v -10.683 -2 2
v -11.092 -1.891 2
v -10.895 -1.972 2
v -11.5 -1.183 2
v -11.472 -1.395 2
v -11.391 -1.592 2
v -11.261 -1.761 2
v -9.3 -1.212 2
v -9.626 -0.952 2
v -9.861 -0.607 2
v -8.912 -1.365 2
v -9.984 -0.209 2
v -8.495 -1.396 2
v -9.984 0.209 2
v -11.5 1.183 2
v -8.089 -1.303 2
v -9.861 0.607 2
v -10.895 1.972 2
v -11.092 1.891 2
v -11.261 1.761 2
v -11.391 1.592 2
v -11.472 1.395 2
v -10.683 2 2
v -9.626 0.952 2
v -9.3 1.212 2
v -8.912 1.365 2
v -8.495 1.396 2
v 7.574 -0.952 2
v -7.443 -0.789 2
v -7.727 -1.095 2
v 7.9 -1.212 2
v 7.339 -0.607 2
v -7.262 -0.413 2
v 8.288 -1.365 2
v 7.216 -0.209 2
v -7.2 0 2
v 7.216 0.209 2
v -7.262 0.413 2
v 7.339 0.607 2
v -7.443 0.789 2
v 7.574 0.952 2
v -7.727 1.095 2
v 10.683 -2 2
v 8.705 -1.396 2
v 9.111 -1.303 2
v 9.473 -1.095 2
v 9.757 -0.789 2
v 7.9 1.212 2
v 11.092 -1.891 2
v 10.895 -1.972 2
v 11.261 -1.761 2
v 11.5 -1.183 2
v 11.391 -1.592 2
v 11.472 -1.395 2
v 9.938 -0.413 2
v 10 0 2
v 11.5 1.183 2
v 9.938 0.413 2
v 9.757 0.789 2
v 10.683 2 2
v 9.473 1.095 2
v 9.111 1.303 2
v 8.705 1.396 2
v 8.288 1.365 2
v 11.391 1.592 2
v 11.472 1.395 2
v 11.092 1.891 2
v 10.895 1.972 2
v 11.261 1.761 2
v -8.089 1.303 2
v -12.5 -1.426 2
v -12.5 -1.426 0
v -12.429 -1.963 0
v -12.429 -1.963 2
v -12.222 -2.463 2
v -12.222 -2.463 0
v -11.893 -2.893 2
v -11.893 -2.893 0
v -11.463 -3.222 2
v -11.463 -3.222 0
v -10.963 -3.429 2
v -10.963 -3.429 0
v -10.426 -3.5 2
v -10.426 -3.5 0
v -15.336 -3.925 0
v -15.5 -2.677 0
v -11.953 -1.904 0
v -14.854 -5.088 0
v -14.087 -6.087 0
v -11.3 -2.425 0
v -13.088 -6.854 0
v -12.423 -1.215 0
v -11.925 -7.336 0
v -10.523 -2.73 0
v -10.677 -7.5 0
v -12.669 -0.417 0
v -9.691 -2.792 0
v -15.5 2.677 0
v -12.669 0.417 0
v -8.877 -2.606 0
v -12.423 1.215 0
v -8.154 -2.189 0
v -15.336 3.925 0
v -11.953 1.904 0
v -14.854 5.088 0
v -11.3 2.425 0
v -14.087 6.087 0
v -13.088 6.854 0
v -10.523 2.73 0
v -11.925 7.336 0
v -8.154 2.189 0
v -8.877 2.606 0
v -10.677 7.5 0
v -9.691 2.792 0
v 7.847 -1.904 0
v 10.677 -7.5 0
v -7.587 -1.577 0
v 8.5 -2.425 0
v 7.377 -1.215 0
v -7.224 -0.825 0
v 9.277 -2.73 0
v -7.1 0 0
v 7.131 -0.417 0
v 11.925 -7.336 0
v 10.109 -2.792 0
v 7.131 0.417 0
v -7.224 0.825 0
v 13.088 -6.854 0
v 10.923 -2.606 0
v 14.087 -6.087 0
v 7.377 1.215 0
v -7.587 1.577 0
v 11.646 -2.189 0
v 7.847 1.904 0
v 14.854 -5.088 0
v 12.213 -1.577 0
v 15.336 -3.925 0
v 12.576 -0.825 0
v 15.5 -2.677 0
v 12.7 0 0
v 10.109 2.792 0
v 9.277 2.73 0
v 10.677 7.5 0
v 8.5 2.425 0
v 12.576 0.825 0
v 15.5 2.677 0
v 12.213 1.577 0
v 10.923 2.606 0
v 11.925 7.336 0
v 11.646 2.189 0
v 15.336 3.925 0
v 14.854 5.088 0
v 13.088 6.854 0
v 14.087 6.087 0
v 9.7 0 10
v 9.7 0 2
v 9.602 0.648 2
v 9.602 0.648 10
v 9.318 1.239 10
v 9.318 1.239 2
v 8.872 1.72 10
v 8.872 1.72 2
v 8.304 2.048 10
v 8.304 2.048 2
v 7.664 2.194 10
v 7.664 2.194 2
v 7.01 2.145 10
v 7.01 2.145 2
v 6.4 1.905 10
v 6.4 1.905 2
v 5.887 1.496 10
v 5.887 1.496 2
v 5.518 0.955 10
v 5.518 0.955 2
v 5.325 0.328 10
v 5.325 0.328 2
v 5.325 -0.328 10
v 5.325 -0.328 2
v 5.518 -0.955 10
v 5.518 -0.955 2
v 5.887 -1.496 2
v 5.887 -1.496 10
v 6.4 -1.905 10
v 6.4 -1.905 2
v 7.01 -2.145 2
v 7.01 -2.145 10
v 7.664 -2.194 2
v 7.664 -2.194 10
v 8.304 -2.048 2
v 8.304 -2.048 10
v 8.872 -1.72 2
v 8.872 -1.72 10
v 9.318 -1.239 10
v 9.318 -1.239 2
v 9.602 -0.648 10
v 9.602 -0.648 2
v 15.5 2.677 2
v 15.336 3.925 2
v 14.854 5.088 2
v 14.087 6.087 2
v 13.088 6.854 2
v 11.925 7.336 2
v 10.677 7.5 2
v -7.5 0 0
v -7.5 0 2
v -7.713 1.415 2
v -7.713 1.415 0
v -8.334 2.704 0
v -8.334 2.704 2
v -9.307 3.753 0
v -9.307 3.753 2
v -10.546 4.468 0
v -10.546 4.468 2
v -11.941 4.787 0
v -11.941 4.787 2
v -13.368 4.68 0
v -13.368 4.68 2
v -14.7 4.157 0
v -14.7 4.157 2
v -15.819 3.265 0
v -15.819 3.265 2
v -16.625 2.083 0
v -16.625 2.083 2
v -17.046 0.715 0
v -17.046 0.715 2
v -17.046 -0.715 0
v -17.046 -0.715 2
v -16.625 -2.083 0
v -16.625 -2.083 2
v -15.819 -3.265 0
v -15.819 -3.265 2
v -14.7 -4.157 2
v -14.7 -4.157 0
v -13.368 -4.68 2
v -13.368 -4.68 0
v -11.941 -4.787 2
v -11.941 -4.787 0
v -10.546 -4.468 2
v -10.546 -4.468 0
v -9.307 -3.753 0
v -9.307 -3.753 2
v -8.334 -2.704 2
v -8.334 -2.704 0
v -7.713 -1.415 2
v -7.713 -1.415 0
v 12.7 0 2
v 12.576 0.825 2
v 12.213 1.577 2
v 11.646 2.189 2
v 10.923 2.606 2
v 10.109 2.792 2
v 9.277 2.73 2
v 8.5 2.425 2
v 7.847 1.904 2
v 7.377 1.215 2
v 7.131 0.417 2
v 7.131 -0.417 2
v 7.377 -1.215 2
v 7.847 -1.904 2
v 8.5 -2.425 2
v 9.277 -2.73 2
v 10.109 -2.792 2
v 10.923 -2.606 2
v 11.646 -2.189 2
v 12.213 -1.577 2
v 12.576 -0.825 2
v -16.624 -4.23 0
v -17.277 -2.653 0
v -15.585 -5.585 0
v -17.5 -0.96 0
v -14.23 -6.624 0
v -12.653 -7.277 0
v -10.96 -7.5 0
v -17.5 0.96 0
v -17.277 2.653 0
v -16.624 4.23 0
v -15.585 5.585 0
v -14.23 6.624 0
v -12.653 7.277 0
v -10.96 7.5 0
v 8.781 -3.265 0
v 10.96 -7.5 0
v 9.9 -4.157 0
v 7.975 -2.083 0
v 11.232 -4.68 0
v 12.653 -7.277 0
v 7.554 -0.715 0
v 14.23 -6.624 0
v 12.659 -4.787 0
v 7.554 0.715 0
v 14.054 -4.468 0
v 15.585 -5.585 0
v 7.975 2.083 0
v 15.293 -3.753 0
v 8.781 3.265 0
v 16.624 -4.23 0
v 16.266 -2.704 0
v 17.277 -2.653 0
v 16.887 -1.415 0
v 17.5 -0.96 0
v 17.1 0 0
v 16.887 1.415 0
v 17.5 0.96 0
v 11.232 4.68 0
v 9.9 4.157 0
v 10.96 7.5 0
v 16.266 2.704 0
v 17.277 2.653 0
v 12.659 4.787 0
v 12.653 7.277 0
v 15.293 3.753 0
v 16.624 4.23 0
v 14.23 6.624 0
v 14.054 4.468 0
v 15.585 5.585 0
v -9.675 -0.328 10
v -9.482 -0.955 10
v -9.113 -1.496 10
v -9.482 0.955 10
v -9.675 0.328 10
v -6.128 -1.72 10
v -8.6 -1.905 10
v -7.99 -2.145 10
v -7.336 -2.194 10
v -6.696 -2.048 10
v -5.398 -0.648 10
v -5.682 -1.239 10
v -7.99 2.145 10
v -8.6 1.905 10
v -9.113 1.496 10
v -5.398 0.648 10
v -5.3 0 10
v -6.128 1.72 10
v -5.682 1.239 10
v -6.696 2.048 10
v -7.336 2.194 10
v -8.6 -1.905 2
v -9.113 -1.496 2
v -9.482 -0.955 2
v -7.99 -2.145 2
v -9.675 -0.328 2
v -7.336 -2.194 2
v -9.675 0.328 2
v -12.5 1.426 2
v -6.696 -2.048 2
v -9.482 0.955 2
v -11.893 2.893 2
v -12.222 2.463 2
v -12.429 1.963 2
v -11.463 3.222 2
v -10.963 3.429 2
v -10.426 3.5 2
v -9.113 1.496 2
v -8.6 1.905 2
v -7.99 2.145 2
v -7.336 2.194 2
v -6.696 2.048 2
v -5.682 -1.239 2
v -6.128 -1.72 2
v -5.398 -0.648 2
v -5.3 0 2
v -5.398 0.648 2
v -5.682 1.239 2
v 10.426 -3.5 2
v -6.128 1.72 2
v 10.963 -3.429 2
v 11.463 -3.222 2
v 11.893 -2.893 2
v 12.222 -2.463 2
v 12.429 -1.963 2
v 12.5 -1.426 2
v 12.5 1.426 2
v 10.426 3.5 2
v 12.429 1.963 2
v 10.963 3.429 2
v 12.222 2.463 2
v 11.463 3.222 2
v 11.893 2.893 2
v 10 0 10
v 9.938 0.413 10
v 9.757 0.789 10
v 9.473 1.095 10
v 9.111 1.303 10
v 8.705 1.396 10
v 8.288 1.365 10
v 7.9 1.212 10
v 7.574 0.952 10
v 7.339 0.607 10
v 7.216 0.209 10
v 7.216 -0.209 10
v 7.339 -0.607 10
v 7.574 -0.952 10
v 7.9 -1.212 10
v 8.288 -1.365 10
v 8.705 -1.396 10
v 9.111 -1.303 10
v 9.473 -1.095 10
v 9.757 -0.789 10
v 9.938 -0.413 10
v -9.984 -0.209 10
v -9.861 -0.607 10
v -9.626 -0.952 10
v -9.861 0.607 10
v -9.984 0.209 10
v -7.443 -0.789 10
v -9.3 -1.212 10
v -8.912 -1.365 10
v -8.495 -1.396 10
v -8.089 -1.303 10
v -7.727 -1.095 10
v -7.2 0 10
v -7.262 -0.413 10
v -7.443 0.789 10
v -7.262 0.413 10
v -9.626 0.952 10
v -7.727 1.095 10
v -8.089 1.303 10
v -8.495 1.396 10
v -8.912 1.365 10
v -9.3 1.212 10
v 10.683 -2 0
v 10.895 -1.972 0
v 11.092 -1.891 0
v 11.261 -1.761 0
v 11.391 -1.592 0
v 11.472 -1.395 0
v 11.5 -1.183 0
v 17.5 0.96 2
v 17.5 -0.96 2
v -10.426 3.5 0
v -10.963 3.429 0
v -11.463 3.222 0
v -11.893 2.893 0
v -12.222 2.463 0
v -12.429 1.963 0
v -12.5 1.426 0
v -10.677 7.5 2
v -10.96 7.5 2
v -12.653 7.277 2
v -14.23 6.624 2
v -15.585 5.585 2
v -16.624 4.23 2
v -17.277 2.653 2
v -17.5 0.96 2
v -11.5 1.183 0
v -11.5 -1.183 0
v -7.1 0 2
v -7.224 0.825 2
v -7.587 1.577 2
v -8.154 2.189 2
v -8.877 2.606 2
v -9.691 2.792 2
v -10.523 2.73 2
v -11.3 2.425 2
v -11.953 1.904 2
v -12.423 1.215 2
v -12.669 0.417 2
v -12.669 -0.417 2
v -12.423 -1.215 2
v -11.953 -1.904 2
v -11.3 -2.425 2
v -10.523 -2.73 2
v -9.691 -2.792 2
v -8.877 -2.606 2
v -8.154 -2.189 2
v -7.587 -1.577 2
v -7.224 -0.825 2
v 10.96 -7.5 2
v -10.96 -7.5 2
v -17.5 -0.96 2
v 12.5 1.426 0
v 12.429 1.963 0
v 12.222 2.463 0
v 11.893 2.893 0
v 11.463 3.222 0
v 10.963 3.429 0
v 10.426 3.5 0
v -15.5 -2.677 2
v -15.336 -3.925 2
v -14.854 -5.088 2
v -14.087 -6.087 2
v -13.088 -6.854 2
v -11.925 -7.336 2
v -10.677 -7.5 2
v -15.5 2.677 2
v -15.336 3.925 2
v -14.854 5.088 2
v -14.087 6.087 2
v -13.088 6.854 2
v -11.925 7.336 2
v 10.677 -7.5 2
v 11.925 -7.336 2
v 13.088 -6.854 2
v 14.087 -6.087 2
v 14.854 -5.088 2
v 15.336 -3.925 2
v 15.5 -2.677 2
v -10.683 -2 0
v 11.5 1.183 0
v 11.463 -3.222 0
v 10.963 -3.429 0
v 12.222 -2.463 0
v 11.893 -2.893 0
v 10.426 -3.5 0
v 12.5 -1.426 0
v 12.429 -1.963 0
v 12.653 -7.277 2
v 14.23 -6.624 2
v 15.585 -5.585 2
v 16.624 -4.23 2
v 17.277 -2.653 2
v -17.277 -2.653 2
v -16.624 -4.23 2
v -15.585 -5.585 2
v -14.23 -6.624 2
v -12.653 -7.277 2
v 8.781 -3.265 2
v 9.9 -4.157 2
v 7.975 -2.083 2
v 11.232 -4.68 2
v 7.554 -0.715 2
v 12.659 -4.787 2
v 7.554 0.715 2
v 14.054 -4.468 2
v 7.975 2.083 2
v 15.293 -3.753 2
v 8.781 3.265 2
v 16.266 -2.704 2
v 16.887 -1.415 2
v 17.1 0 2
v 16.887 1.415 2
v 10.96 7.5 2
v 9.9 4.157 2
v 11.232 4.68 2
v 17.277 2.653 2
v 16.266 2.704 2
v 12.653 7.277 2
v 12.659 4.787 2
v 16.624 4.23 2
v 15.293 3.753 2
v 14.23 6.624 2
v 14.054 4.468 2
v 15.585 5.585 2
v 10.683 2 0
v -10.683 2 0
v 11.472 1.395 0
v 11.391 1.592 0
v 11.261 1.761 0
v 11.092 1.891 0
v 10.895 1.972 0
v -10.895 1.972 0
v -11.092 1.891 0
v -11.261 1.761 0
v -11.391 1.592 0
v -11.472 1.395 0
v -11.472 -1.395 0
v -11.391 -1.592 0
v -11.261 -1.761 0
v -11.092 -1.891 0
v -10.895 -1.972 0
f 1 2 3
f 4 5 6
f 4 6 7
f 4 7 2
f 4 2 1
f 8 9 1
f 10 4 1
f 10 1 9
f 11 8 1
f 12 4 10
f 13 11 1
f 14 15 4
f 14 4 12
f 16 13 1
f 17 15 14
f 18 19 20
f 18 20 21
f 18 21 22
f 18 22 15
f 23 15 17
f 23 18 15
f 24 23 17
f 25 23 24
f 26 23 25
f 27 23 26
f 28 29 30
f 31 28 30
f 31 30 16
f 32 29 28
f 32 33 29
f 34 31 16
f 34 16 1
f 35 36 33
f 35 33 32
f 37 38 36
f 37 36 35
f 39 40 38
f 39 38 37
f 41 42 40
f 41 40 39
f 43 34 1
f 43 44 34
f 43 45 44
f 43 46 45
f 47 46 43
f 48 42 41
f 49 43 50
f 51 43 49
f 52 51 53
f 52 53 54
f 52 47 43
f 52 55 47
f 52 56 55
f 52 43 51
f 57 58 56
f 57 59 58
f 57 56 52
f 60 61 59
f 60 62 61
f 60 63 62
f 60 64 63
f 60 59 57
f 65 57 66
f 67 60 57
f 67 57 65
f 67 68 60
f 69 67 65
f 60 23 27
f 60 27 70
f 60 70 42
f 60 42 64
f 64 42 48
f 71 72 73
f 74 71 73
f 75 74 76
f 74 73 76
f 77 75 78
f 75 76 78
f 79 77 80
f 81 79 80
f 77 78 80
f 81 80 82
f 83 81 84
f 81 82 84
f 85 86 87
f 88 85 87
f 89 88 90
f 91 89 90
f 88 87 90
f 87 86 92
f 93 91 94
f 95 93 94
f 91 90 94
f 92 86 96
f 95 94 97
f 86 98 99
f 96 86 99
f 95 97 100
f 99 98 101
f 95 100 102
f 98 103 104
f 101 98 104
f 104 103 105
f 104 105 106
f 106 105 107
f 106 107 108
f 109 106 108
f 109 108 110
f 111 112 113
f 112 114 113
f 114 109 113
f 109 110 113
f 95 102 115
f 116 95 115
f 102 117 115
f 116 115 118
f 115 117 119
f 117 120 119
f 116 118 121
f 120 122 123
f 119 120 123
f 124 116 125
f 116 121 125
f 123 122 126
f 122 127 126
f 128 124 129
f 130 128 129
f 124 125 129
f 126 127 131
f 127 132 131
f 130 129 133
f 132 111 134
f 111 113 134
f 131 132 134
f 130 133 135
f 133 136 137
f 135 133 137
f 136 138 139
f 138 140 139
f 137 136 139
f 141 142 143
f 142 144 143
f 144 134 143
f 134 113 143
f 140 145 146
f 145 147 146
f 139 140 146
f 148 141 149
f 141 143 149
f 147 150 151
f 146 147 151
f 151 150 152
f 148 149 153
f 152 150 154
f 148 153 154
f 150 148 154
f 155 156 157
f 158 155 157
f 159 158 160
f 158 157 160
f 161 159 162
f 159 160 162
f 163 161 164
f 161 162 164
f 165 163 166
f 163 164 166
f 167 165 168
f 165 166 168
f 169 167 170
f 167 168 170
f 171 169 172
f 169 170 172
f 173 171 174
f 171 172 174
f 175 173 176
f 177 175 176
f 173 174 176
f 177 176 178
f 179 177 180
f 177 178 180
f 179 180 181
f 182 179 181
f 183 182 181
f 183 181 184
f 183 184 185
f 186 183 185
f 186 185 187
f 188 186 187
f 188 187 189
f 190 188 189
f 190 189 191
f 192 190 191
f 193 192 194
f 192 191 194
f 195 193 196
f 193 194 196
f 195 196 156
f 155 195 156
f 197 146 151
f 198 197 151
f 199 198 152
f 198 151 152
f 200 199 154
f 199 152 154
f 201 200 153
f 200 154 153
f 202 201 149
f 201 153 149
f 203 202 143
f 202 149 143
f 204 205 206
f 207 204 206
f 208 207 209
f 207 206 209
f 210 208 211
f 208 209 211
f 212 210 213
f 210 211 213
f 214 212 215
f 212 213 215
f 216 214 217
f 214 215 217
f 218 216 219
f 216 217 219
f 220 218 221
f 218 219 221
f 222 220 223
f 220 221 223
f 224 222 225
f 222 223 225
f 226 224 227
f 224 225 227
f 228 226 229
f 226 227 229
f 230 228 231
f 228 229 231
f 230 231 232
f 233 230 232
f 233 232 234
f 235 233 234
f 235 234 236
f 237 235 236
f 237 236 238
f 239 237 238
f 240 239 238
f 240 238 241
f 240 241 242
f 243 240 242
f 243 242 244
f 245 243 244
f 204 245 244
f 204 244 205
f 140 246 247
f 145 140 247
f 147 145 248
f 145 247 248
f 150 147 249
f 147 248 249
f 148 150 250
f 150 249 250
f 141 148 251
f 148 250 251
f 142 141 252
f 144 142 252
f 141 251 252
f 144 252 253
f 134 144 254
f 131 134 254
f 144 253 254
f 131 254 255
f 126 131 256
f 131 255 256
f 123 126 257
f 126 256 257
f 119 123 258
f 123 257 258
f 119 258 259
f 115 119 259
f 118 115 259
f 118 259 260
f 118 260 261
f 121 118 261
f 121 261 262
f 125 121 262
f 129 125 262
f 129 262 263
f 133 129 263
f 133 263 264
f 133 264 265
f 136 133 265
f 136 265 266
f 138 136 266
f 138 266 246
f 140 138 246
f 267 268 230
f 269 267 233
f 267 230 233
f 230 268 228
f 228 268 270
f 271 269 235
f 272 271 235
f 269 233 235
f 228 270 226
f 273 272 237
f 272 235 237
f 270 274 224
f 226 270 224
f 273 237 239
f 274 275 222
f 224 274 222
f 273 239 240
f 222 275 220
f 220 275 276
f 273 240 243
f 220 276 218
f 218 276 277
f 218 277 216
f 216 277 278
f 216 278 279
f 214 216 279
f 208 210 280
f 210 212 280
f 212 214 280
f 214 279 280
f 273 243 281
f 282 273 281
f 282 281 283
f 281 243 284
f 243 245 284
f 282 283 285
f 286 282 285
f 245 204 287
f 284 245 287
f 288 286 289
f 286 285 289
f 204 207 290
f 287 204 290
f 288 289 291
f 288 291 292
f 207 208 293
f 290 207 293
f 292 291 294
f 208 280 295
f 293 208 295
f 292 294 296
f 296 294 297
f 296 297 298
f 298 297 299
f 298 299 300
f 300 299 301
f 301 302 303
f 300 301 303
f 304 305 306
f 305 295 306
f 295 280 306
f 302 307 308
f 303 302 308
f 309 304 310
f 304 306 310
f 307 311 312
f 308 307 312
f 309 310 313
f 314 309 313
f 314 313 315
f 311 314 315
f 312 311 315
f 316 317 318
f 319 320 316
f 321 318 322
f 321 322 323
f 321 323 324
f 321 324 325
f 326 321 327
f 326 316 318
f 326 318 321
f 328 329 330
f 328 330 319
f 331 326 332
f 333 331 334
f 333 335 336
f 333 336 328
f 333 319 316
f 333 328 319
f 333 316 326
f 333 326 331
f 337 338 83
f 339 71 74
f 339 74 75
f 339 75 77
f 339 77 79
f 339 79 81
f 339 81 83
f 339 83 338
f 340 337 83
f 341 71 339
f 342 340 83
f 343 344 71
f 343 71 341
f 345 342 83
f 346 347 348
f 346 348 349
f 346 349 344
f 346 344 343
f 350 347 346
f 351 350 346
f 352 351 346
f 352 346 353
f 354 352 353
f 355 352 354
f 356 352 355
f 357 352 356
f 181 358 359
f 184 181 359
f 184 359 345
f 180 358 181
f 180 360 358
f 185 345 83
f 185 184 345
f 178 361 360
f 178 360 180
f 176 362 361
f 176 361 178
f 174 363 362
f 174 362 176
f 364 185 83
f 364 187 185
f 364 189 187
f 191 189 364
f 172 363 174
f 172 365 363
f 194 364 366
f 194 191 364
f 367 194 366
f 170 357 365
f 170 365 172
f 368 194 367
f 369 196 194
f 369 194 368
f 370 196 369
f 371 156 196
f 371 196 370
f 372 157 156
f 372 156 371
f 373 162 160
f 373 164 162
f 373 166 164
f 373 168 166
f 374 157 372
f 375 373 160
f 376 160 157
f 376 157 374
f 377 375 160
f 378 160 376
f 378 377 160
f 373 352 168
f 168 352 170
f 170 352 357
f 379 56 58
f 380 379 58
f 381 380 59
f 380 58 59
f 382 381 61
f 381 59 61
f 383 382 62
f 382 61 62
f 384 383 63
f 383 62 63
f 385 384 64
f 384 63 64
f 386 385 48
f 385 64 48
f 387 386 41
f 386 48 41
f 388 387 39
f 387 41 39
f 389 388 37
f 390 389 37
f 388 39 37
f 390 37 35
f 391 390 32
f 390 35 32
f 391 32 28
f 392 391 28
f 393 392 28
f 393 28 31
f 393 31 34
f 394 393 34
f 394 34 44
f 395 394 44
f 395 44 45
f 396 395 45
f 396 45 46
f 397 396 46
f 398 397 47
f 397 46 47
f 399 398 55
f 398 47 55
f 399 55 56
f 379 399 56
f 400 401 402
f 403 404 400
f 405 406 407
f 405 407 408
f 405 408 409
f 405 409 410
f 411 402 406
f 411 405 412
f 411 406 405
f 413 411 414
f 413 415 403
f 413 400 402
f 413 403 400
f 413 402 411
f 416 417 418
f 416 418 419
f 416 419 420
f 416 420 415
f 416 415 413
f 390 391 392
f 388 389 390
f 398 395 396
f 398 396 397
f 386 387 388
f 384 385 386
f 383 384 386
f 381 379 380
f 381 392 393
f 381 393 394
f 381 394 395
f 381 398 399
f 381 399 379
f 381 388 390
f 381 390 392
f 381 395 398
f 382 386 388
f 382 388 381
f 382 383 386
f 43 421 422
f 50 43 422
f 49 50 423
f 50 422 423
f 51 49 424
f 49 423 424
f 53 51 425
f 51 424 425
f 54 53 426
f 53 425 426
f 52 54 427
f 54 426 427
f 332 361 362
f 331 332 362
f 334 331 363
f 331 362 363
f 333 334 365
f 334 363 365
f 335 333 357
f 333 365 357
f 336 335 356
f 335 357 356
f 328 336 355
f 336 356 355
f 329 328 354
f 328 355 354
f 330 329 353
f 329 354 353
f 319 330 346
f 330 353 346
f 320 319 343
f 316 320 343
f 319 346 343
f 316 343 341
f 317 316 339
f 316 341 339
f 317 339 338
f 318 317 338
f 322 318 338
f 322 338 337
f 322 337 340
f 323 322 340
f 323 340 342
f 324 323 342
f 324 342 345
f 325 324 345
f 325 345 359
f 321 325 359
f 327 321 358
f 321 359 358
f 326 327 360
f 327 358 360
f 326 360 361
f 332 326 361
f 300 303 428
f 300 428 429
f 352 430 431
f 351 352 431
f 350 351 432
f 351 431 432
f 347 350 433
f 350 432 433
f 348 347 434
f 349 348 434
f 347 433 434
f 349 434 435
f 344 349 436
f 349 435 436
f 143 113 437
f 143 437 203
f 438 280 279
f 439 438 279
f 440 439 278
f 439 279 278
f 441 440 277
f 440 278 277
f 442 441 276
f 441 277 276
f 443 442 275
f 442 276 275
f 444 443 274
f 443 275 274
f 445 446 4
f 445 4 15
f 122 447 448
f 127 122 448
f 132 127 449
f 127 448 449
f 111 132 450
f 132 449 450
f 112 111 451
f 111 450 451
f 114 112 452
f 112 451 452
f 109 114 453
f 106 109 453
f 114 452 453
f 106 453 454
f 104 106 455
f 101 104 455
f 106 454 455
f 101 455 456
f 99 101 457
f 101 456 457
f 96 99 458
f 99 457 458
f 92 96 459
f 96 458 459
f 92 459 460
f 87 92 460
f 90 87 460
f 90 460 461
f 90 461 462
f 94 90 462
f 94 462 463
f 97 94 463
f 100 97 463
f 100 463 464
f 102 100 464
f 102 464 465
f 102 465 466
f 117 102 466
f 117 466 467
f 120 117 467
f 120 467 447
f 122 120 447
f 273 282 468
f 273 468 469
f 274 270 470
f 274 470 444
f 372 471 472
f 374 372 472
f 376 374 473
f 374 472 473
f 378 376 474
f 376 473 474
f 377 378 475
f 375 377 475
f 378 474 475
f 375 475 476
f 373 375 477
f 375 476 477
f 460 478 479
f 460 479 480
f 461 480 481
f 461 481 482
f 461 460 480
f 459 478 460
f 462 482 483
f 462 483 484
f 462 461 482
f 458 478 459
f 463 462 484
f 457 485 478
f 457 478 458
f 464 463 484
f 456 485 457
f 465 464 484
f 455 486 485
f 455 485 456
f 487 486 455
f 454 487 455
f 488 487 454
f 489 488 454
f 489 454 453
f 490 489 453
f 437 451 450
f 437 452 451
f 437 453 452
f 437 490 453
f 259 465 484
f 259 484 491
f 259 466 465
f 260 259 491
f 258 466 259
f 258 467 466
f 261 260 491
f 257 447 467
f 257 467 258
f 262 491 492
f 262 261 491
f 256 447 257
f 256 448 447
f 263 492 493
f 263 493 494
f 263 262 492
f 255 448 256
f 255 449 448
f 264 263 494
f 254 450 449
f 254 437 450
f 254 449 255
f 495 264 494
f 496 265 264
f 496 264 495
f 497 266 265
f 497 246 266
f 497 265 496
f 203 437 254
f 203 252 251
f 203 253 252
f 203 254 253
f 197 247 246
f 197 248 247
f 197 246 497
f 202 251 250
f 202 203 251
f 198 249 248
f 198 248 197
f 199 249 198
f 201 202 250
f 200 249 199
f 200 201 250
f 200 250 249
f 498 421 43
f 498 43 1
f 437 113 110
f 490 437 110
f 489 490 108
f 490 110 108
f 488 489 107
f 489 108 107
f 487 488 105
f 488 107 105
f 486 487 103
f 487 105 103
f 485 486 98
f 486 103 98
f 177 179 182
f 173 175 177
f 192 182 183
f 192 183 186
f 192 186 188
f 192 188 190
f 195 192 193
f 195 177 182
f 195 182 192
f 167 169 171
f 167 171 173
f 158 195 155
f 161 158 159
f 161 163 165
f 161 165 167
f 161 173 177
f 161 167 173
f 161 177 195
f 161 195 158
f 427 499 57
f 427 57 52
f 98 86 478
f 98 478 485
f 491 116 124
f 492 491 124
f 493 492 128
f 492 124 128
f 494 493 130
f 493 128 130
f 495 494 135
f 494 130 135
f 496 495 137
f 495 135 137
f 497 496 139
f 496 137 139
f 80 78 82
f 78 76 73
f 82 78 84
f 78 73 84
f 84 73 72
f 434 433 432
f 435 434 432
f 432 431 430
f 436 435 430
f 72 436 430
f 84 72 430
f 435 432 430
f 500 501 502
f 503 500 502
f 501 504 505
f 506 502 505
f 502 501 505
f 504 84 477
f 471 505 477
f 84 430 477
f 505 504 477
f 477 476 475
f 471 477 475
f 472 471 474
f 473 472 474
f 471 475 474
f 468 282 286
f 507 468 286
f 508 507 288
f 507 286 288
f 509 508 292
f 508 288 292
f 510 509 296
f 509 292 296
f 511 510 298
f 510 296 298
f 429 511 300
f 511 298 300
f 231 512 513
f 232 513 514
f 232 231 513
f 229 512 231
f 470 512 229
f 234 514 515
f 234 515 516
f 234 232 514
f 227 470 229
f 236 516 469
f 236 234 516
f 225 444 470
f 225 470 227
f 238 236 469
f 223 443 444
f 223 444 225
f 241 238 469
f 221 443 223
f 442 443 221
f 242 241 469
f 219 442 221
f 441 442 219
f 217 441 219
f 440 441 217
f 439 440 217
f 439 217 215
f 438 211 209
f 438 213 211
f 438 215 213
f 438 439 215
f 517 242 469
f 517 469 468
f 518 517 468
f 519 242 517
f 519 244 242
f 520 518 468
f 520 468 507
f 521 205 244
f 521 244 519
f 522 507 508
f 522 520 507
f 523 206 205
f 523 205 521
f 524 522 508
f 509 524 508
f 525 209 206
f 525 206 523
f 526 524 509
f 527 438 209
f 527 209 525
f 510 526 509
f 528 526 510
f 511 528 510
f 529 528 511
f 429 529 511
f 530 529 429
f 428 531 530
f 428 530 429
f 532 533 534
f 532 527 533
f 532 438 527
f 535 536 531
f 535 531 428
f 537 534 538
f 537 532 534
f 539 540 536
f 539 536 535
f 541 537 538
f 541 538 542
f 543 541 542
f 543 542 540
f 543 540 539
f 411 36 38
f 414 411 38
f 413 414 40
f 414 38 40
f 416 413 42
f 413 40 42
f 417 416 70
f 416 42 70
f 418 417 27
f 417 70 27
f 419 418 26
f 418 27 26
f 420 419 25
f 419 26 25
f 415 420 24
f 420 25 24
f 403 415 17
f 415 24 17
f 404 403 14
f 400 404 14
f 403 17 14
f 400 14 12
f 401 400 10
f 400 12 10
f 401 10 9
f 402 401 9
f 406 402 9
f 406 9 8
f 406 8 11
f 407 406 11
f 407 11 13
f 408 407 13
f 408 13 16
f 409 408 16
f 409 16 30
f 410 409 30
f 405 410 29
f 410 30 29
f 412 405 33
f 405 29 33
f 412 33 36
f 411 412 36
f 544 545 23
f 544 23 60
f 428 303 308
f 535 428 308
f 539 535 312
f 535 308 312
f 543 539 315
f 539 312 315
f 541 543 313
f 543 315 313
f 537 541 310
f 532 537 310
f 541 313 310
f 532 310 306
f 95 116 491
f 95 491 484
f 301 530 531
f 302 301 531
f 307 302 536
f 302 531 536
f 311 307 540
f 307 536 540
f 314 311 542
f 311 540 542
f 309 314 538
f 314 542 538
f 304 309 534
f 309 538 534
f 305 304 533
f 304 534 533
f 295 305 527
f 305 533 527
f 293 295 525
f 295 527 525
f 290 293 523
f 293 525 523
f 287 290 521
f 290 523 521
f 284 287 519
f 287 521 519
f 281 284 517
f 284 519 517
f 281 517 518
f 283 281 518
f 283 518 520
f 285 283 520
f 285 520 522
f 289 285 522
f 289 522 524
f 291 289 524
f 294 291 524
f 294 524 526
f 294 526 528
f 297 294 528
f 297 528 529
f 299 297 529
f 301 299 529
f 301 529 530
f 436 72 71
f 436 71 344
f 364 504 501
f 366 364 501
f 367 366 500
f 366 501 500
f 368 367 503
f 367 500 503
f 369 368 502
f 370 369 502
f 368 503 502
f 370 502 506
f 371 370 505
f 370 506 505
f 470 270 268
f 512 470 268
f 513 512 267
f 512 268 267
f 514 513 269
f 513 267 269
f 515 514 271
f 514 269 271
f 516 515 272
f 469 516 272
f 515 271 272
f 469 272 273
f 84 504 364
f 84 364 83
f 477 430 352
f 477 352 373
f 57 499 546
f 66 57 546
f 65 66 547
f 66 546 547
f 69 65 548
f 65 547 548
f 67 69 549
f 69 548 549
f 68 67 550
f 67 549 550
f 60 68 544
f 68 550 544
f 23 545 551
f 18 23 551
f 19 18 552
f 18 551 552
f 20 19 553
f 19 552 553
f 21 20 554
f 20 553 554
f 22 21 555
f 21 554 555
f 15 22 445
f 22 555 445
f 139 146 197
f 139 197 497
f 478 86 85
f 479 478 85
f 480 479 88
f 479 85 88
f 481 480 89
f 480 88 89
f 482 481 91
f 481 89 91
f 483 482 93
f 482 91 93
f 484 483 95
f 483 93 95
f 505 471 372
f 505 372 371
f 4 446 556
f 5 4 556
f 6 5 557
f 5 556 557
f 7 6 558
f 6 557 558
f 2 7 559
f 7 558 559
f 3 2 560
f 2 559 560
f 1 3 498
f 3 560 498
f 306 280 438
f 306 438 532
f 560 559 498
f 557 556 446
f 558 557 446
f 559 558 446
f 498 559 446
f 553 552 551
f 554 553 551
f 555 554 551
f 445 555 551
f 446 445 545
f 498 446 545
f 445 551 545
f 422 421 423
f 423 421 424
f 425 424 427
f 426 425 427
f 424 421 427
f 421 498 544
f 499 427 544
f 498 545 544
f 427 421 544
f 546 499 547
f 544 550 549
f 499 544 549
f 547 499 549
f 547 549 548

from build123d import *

# Parameters (mm, degrees)
PAD_DEPTH       = 2
SKETCH001_R     = 2.2
PAD001_DEPTH    = 8
PAD002_DEPTH    = 2
SKETCH003_R     = 4.8
POCKET_DEPTH    = 5
PAD003_DEPTH    = 2
SKETCH005_R     = 1.4
PAD004_DEPTH    = 8
PAD005_DEPTH    = 2
SKETCH007_R     = 2.8
POCKET001_DEPTH = 5


with BuildPart() as extruded5mm:
    # Sketch → Pad (new body)
    with BuildSketch(Plane.XY):
        with BuildLine():
            ThreePointArc((-10.426142, 3.5), (-11.892581, 2.892581), (-12.5, 1.426142))
            Line((-12.5, -1.426142), (-12.5, 1.426142))
            ThreePointArc((-12.5, -1.426142), (-11.892581, -2.892581), (-10.426142, -3.5))
            Line((10.426142, -3.5), (-10.426142, -3.5))
            ThreePointArc((10.426142, -3.5), (11.892581, -2.892581), (12.5, -1.426142))
            Line((12.5, 1.426142), (12.5, -1.426142))
            ThreePointArc((12.5, 1.426142), (11.892581, 2.892581), (10.426142, 3.5))
            Line((-10.426142, 3.5), (10.426142, 3.5))
        make_face()
    extrude(amount=PAD_DEPTH)

    # Sketch001 (on Face10 of Pad) → Pad001 (join)
    with BuildSketch(Plane.XY.offset(2)):
        with Locations((-7.5, 0)):
            Circle(SKETCH001_R)
        with Locations((7.5, 0)):
            Circle(SKETCH001_R)
    extrude(amount=PAD001_DEPTH)


with BuildPart() as end5mm:
    # Sketch002 → Pad002 (new body)
    with BuildSketch(Plane.XY):
        with BuildLine():
            ThreePointArc((-10.960184, 7.5), (-15.584532, 5.584532), (-17.5, 0.960184))
            Line((-17.5, -0.960184), (-17.5, 0.960184))
            ThreePointArc((-17.5, -0.960184), (-15.584532, -5.584532), (-10.960184, -7.5))
            Line((10.960184, -7.5), (-10.960184, -7.5))
            ThreePointArc((10.960184, -7.5), (15.584532, -5.584532), (17.5, -0.960184))
            Line((17.5, 0.960184), (17.5, -0.960184))
            ThreePointArc((17.5, 0.960184), (15.584532, 5.584532), (10.960184, 7.5))
            Line((-10.960184, 7.5), (10.960184, 7.5))
        make_face()
    extrude(amount=PAD002_DEPTH)

    # Sketch003 (on Face10 of Pad002) → Pocket (cut)
    with BuildSketch(Plane.XY.offset(2)):
        with Locations((-12.3, 0)):
            Circle(SKETCH003_R)
        with Locations((12.3, 0)):
            Circle(SKETCH003_R)
    extrude(amount=-POCKET_DEPTH, mode=Mode.SUBTRACT)


with BuildPart() as extruded3mm:
    # Sketch004 → Pad003 (new body)
    with BuildSketch(Plane.XY):
        with BuildLine():
            ThreePointArc((-10.683274, 2), (-11.260787, 1.760787), (-11.5, 1.183274))
            Line((-11.5, -1.183274), (-11.5, 1.183274))
            ThreePointArc((-11.5, -1.183274), (-11.260787, -1.760787), (-10.683274, -2))
            Line((10.683274, -2), (-10.683274, -2))
            ThreePointArc((10.683274, -2), (11.260787, -1.760787), (11.5, -1.183274))
            Line((11.5, 1.183274), (11.5, -1.183274))
            ThreePointArc((11.5, 1.183274), (11.260787, 1.760787), (10.683274, 2))
            Line((-10.683274, 2), (10.683274, 2))
        make_face()
    extrude(amount=PAD003_DEPTH)

    # Sketch005 (on Face10 of Pad003) → Pad004 (join)
    with BuildSketch(Plane.XY.offset(2)):
        with Locations((-8.6, 0)):
            Circle(SKETCH005_R)
        with Locations((8.6, 0)):
            Circle(SKETCH005_R)
    extrude(amount=PAD004_DEPTH)


with BuildPart() as extruded3mm001:
    # Sketch006 → Pad005 (new body)
    with BuildSketch(Plane.XY):
        with BuildLine():
            ThreePointArc((-10.676866, 7.5), (-14.087337, 6.087337), (-15.5, 2.676866))
            Line((-15.5, -2.676866), (-15.5, 2.676866))
            ThreePointArc((-15.5, -2.676866), (-14.087337, -6.087337), (-10.676866, -7.5))
            Line((10.676866, -7.5), (-10.676866, -7.5))
            ThreePointArc((10.676866, -7.5), (14.087337, -6.087337), (15.5, -2.676866))
            Line((15.5, 2.676866), (15.5, -2.676866))
            ThreePointArc((15.5, 2.676866), (14.087337, 6.087337), (10.676866, 7.5))
            Line((-10.676866, 7.5), (10.676866, 7.5))
        make_face()
    extrude(amount=PAD005_DEPTH)

    # Sketch007 (on Face10 of Pad005) → Pocket001 (cut)
    with BuildSketch(Plane.XY.offset(2)):
        with Locations((-9.9, 0)):
            Circle(SKETCH007_R)
        with Locations((9.9, 0)):
            Circle(SKETCH007_R)
    extrude(amount=-POCKET001_DEPTH, mode=Mode.SUBTRACT)


solid = Compound([extruded5mm.part, end5mm.part, extruded3mm.part, extruded3mm001.part])
